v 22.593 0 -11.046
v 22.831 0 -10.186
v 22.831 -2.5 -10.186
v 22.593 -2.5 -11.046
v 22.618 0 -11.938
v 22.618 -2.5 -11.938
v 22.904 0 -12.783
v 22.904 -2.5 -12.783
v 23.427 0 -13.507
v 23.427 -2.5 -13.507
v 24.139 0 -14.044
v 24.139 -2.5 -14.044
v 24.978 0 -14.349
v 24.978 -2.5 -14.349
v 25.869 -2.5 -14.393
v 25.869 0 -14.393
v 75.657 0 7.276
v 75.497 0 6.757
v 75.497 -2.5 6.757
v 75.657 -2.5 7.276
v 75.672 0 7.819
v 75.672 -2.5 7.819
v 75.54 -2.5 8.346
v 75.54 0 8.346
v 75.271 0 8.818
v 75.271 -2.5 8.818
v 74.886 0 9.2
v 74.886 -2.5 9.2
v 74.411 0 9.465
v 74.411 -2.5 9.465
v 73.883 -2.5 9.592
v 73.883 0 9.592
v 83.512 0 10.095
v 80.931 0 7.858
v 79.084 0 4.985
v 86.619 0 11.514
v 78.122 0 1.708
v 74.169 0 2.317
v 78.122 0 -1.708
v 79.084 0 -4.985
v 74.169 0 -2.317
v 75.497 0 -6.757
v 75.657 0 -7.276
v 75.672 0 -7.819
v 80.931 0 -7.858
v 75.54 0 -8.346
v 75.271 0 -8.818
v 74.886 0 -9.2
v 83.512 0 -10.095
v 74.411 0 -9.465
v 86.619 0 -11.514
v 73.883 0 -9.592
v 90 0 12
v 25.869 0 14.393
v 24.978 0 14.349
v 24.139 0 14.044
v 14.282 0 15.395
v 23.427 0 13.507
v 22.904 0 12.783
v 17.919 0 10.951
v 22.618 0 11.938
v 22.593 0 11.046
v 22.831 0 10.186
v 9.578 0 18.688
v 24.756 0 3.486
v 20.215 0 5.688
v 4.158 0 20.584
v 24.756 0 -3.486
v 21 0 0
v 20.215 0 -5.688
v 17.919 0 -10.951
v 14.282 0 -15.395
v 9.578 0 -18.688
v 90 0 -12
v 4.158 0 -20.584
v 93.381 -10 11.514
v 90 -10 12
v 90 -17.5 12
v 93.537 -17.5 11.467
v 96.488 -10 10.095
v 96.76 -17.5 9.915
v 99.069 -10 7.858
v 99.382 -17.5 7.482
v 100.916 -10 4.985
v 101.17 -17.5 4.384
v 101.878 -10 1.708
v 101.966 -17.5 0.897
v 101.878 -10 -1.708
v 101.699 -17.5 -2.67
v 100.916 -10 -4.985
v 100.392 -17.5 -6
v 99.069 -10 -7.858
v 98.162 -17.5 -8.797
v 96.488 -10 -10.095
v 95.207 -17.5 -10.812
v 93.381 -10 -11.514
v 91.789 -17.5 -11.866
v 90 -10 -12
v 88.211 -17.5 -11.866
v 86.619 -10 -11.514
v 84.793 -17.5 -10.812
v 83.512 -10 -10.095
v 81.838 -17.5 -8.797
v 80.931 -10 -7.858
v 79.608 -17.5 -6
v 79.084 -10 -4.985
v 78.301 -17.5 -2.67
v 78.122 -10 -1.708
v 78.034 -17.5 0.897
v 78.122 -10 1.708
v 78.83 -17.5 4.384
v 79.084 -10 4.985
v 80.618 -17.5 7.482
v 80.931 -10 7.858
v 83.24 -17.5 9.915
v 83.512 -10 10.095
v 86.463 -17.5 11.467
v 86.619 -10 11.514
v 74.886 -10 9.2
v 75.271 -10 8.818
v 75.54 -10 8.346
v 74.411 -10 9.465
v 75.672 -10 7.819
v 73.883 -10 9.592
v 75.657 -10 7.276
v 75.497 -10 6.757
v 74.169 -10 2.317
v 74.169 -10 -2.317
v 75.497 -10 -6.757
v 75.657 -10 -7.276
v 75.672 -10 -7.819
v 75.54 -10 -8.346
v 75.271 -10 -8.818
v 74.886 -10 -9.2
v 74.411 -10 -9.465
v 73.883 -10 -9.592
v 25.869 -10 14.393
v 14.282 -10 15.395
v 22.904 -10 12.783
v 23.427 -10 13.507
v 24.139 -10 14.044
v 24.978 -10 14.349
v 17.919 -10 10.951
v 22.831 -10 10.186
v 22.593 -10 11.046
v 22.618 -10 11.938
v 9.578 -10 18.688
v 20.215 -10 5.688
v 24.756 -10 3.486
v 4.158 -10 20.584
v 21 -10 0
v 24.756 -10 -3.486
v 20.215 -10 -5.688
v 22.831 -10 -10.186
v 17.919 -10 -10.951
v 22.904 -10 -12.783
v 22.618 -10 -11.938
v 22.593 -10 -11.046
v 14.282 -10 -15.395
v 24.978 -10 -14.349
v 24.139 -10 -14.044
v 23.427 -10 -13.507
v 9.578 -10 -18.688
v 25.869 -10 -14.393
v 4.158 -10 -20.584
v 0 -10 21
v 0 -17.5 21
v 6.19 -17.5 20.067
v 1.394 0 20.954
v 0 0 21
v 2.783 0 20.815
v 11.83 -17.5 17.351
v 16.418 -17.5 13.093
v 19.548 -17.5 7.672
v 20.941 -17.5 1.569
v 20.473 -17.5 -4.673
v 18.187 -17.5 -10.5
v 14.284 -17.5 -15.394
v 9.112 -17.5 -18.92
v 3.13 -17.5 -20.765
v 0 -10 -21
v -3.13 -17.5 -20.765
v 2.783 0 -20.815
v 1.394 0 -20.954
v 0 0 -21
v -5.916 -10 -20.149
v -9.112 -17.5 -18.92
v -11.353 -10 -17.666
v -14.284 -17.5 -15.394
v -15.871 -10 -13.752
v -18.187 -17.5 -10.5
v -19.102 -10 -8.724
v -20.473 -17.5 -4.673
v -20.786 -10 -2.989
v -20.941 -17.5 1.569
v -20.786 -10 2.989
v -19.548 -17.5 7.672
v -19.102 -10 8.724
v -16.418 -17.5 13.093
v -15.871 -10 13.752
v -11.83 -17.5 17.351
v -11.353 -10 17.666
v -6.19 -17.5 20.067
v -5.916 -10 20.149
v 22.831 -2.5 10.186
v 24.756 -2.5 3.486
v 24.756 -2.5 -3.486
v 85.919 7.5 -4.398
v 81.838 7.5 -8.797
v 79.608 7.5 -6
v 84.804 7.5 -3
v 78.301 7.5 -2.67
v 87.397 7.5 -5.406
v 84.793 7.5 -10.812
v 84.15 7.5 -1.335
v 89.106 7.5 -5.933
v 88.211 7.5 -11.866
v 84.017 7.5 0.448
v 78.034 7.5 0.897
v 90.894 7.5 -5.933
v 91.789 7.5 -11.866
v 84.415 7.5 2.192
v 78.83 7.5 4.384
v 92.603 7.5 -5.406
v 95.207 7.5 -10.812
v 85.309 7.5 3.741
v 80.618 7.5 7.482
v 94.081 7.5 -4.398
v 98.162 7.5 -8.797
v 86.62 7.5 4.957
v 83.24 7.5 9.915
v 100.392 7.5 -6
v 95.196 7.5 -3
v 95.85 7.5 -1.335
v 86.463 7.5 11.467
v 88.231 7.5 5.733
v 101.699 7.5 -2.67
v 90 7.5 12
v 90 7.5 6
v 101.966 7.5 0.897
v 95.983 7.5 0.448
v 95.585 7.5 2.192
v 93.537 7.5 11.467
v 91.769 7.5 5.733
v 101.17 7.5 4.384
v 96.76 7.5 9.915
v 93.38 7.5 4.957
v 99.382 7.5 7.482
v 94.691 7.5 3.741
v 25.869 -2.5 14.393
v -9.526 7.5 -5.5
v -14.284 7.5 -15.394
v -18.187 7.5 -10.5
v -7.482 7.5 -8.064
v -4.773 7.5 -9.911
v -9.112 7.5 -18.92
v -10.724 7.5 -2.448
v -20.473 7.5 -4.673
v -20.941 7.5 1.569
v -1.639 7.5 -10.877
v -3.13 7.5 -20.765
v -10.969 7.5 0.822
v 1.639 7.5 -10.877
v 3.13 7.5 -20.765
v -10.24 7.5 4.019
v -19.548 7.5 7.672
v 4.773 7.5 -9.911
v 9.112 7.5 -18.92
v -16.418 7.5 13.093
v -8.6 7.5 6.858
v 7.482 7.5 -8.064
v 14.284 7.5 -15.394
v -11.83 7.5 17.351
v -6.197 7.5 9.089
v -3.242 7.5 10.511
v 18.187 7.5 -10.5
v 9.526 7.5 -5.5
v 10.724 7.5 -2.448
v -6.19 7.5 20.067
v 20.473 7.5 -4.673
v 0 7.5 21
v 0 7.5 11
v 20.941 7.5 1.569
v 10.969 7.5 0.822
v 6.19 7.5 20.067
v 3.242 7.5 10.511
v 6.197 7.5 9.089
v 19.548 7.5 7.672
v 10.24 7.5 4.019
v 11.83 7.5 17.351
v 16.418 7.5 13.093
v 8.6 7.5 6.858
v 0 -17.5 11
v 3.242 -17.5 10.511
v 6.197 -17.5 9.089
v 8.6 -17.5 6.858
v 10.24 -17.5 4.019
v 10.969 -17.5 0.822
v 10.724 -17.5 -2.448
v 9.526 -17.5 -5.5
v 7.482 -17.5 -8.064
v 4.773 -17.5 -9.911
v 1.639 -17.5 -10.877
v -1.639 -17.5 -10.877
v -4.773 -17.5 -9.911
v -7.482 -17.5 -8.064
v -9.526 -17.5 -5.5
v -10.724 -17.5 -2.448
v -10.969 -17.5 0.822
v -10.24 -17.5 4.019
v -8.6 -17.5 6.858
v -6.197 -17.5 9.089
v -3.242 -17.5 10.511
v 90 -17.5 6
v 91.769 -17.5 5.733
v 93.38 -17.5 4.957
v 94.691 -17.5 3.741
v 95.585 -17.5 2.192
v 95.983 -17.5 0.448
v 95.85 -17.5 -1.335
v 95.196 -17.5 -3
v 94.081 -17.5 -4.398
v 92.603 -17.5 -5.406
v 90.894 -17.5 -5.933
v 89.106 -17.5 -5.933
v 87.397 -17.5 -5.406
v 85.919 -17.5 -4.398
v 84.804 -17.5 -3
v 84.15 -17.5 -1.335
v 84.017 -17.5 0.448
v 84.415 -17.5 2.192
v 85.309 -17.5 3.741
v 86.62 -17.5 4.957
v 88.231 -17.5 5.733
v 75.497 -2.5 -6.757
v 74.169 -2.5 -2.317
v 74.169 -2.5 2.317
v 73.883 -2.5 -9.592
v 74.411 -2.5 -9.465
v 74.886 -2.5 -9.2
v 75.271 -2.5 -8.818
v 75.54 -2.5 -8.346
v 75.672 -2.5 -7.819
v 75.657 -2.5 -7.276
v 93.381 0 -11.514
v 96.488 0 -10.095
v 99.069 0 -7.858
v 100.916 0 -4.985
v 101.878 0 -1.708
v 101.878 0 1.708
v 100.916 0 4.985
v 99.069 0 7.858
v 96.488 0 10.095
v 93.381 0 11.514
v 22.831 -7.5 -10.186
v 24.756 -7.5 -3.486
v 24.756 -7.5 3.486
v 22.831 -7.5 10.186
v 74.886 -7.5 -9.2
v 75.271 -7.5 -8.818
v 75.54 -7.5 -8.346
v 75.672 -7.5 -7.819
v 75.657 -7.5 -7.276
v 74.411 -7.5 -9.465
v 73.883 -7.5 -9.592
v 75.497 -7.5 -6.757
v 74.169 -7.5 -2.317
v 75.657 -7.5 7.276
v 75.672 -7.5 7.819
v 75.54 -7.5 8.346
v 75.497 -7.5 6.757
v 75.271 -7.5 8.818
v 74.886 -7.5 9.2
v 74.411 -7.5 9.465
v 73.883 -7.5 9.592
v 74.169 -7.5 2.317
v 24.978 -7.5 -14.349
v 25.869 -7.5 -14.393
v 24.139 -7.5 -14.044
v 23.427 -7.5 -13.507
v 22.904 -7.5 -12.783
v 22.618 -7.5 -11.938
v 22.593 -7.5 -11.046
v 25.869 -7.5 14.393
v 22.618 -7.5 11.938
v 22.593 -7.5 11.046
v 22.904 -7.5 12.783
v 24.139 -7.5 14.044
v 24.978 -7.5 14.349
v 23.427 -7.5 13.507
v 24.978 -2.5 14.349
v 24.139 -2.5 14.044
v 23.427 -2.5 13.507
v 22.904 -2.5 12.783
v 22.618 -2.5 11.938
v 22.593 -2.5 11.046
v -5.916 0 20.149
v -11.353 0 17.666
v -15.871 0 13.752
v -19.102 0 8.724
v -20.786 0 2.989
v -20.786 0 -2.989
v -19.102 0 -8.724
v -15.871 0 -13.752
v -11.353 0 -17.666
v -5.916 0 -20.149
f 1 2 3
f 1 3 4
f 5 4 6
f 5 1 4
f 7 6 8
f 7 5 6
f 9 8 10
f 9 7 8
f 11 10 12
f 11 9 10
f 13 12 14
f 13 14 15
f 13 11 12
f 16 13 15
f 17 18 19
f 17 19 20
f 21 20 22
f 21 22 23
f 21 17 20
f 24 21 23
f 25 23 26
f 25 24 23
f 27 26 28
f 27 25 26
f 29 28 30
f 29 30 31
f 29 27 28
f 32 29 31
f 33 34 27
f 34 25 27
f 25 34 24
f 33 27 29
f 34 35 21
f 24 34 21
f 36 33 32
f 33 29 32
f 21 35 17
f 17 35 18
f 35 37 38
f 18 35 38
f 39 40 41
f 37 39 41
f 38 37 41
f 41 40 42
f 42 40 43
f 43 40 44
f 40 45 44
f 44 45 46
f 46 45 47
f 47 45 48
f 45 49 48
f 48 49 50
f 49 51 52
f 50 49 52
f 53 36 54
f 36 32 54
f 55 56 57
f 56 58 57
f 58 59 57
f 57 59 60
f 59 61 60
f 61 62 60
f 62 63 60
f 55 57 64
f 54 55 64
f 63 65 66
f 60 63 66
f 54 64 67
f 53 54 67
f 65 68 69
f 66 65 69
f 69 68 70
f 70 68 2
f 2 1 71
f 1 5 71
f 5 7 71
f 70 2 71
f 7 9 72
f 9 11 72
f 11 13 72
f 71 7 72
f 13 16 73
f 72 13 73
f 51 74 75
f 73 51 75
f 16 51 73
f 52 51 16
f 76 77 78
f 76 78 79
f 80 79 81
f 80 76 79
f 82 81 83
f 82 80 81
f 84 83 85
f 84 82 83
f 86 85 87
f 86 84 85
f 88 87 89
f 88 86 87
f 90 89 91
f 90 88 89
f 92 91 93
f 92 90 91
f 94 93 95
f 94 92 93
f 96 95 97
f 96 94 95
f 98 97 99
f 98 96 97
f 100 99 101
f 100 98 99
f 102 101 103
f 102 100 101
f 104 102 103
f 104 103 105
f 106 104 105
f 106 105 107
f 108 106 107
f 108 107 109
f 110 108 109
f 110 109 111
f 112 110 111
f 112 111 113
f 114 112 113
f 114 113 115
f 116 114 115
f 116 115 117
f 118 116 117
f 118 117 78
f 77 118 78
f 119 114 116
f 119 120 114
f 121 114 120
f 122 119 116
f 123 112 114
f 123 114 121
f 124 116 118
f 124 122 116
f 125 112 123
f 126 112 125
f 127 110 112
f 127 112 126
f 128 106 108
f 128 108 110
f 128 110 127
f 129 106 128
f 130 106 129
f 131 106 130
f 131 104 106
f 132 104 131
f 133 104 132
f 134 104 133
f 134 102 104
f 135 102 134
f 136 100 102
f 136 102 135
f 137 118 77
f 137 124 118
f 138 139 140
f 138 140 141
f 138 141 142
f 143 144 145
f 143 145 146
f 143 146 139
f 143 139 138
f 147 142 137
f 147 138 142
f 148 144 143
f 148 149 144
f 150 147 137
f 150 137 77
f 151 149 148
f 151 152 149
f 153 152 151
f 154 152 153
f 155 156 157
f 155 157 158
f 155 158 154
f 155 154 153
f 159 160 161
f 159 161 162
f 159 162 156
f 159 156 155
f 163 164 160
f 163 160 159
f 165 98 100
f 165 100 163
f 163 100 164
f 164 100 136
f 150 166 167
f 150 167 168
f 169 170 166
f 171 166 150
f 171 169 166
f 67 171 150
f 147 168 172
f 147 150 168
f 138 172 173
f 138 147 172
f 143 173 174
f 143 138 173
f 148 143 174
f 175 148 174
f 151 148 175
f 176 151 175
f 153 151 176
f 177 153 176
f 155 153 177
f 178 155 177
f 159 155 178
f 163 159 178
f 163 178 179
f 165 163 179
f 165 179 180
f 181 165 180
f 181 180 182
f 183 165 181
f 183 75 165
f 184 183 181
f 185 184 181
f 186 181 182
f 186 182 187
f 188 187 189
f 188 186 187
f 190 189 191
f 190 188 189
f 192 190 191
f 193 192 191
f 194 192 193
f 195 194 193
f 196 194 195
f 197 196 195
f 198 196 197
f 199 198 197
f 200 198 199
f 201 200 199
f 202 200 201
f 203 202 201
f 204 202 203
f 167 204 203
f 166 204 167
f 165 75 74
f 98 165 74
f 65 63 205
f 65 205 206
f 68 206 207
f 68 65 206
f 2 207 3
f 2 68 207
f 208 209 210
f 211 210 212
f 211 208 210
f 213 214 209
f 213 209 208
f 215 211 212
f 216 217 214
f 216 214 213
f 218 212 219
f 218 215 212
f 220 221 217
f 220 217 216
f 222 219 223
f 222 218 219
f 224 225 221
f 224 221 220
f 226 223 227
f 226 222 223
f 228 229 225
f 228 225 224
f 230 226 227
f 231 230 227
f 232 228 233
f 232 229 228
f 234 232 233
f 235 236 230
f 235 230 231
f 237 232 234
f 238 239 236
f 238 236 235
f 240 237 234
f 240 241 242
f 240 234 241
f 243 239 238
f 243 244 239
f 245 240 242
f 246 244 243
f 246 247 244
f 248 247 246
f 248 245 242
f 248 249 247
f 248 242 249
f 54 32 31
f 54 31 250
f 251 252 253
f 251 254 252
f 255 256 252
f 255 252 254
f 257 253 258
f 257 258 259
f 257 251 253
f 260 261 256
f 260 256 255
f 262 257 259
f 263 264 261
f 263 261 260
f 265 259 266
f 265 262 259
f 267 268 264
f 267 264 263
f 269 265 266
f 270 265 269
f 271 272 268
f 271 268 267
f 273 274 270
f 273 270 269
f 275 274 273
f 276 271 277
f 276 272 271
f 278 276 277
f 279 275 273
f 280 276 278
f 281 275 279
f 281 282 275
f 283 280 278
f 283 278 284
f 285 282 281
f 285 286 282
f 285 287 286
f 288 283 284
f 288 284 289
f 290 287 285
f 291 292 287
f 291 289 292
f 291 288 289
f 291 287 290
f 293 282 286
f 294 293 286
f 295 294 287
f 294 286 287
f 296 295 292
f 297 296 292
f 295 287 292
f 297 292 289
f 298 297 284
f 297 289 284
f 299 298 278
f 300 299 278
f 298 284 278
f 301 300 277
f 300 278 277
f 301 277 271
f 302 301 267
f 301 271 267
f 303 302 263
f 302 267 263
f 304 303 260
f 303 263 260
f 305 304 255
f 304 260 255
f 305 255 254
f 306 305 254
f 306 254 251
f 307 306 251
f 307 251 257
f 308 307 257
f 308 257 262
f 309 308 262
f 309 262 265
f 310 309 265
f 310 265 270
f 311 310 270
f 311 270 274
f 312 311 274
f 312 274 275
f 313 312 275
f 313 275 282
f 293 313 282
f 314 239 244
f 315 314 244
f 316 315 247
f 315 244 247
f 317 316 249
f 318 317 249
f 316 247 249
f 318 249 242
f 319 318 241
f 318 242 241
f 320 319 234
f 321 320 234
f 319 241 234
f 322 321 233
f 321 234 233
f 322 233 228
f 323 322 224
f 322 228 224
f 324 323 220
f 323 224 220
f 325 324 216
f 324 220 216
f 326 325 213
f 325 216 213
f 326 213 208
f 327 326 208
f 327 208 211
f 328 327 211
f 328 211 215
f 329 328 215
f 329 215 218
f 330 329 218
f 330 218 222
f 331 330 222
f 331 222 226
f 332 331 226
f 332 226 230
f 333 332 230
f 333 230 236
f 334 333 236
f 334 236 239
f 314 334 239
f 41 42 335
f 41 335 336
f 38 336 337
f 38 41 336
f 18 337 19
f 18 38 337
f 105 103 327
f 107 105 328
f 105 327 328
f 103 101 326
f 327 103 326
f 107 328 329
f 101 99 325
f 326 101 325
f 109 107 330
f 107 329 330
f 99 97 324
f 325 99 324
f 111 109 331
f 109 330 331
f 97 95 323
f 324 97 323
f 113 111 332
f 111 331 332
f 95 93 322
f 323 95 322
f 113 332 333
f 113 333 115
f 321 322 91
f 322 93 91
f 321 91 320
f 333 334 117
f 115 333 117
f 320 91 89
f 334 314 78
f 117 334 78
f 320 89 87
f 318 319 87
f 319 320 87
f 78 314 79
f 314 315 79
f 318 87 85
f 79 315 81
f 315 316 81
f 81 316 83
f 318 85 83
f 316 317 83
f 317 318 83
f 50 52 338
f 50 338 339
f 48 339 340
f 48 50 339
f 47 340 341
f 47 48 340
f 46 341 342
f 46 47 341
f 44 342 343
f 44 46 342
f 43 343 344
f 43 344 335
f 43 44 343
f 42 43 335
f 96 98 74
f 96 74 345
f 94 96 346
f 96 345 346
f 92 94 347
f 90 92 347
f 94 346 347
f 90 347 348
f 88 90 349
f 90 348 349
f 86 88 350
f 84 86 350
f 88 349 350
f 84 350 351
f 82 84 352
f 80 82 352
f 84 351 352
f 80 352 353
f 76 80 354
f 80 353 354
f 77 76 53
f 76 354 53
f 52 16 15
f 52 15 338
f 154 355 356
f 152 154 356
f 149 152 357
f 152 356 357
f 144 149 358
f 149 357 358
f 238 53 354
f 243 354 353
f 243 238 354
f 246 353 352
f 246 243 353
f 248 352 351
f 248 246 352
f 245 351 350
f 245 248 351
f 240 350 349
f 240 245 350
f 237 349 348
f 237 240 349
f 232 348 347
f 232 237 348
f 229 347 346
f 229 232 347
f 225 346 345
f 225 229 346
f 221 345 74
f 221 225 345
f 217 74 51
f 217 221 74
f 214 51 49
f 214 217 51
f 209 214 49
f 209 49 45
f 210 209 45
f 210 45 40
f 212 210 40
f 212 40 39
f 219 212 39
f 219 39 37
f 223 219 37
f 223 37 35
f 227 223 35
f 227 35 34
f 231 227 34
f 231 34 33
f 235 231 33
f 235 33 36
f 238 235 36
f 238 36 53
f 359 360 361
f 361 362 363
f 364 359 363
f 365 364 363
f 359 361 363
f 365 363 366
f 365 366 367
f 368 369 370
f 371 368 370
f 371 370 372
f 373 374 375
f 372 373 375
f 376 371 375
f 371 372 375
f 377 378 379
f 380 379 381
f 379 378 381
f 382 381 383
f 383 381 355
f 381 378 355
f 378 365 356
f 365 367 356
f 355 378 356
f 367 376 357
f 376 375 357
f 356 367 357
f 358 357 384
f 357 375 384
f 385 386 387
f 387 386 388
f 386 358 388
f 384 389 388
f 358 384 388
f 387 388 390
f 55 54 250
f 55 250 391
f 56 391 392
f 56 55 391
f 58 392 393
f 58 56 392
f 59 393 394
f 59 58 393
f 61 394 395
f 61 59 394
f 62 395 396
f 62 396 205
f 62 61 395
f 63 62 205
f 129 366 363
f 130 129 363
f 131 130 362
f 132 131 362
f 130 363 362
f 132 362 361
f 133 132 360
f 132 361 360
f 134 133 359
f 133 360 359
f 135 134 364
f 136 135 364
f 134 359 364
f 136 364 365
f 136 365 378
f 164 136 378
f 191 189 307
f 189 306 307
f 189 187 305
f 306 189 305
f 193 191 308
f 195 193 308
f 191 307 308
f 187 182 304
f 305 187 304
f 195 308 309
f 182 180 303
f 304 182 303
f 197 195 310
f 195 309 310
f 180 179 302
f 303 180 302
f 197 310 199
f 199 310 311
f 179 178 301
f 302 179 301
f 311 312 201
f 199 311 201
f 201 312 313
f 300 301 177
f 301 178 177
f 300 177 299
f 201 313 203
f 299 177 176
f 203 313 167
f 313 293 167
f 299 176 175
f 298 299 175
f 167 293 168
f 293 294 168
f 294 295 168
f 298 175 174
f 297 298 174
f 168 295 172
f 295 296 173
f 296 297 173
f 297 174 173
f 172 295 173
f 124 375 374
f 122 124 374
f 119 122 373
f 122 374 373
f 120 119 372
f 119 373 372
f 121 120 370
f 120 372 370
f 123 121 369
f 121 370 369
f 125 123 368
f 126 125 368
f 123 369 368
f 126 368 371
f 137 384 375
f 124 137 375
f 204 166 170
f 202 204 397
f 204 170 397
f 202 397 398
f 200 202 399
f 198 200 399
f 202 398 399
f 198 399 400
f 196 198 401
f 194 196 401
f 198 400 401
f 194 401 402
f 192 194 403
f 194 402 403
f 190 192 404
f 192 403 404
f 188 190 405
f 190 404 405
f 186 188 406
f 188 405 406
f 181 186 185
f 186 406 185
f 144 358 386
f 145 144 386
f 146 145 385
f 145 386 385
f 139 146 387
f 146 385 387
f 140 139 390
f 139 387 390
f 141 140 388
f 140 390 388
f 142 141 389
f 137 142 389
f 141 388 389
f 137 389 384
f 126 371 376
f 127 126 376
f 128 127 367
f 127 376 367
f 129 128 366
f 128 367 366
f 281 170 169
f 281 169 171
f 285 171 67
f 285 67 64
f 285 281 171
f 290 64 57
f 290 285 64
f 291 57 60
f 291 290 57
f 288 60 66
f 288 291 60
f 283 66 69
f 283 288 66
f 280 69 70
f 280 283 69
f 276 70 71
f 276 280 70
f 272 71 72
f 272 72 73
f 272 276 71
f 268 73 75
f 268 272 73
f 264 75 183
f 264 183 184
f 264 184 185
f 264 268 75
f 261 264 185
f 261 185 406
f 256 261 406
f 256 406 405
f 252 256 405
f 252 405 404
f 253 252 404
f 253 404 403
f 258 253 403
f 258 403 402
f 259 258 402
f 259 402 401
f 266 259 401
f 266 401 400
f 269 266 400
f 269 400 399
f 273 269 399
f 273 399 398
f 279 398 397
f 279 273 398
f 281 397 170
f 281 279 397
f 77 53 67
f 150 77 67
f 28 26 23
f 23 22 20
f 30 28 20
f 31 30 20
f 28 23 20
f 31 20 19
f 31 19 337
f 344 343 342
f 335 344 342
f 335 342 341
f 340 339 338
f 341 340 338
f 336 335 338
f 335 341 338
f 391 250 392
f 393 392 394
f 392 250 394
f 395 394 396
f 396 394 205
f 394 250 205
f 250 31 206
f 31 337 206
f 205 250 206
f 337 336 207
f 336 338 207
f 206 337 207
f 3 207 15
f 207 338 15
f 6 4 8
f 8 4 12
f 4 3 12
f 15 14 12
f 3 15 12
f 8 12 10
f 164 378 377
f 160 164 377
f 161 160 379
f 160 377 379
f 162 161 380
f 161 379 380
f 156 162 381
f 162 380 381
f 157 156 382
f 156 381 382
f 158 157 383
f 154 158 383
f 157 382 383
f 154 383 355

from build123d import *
from build123d.topology import SkipClean

# Parameters (mm, degrees)
BOSS_EXTRUDE1_DEPTH = 10
SKETCH2_R           = 21
SKETCH2_R_2         = 12
BOSS_EXTRUDE2_DEPTH = 17.5
BOSS_EXTRUDE3_START = 7.5
SKETCH3_R           = 21
SKETCH3_R_2         = 12
BOSS_EXTRUDE3_DEPTH = 7.5
SKETCH4_R           = 11
SKETCH4_R_2         = 6
CUT_EXTRUDE1_DEPTH  = 38.5
CUT_EXTRUDE2_DEPTH  = 2.5
CUT_EXTRUDE3_START  = -2.5
CUT_EXTRUDE3_DEPTH  = 2.5


with BuildPart() as part:
    # Sketch1 → Boss-Extrude1 (new body)
    with BuildSketch(Plane(origin=(0, 0, 0), x_dir=(1, 0, 0), z_dir=(0, 1, 0))):
        with BuildLine():
            Line((0, 21), (90, 12))
            ThreePointArc((90, 12), (102, 0), (90, -12))
            Line((90, -12), (0, -21))
            ThreePointArc((0, -21), (-21, 0), (0, 21))
        make_face()
    extrude(amount=-BOSS_EXTRUDE1_DEPTH)

    # Sketch2 → Boss-Extrude2 (add)
    with SkipClean():  # the faces are left unmerged after this step: merging them gives an invalid solid
        with BuildSketch(Plane(origin=(0, 0, 0), x_dir=(1, 0, 0), z_dir=(0, 1, 0))):
            with Locations(Location((0, 0, 0), (0, 0, 270))):
                Circle(SKETCH2_R)
            with Locations(Location((90, 0, 0), (0, 0, 270))):
                Circle(SKETCH2_R_2)
        extrude(amount=-BOSS_EXTRUDE2_DEPTH)

    # Sketch3 → Boss-Extrude3 (add)
    with SkipClean():  # the faces are left unmerged after this step: merging them gives an invalid solid
        with BuildSketch(Plane(origin=(0, 0, 0), x_dir=(1, 0, 0), z_dir=(0, 1, 0)).offset(BOSS_EXTRUDE3_START)):
            with Locations(Location((0, 0, 0), (0, 0, 270))):
                Circle(SKETCH3_R)
            with Locations(Location((90, 0, 0), (0, 0, 270))):
                Circle(SKETCH3_R_2)
        extrude(amount=-BOSS_EXTRUDE3_DEPTH)

    # Sketch4 → Cut-Extrude1 (cut)
    with SkipClean():  # the faces are left unmerged after this step: merging them gives an invalid solid
        with BuildSketch(Plane(origin=(0, 7.5, 0), x_dir=(1, 0, 0), z_dir=(0, 1, 0))):
            with Locations(Location((0, 0, 0), (0, 0, 270))):
                Circle(SKETCH4_R)
            with Locations(Location((90, 0, 0), (0, 0, 270))):
                Circle(SKETCH4_R_2)
        extrude(amount=-CUT_EXTRUDE1_DEPTH, mode=Mode.SUBTRACT)

    # Sketch5 → Cut-Extrude2 (cut)
    with SkipClean():  # the faces are left unmerged after this step: merging them gives an invalid solid
        with BuildSketch(Plane(origin=(0, 0, 0), x_dir=(1, 0, 0), z_dir=(0, 1, 0))):
            with BuildLine():
                Line((25.869138462, 14.393135905), (73.882928765, 9.591756875))
                ThreePointArc((73.882928765, 9.591756875), (75.42197475, 8.591212838), (75.496818958, 6.757051106))
                ThreePointArc((75.496818958, 6.757051106), (74, 0), (75.496818958, -6.757051106))
                ThreePointArc((75.496818958, -6.757051106), (75.42197475, -8.591212838), (73.882928765, -9.591756875))
                Line((73.882928765, -9.591756875), (25.869138462, -14.393135905))
                ThreePointArc((25.869138462, -14.393135905), (23.13846438, -13.164322574), (22.830917237, -10.185736013))
                ThreePointArc((22.830917237, -10.185736013), (25, 0), (22.830917237, 10.185736013))
                ThreePointArc((22.830917237, 10.185736013), (23.13846438, 13.164322574), (25.869138462, 14.393135905))
            make_face()
        extrude(amount=-CUT_EXTRUDE2_DEPTH, mode=Mode.SUBTRACT)

    # Sketch7 → Cut-Extrude3 (cut)
    with SkipClean():  # the faces are left unmerged after this step: merging them gives an invalid solid
        with BuildSketch(Plane.XZ.offset(10).offset(CUT_EXTRUDE3_START)):
            with BuildLine():
                Line((25.869138462, 14.393135905), (73.882928765, 9.591756875))
                ThreePointArc((73.882928765, 9.591756875), (75.42197475, 8.591212838), (75.496818958, 6.757051106))
                ThreePointArc((75.496818958, 6.757051106), (74, 0), (75.496818958, -6.757051106))
                ThreePointArc((75.496818958, -6.757051106), (75.42197475, -8.591212838), (73.882928765, -9.591756875))
                Line((73.882928765, -9.591756875), (25.869138462, -14.393135905))
                ThreePointArc((25.869138462, -14.393135905), (23.13846438, -13.164322574), (22.830917237, -10.185736013))
                ThreePointArc((22.830917237, -10.185736013), (25, 0), (22.830917237, 10.185736013))
                ThreePointArc((22.830917237, 10.185736013), (23.13846438, 13.164322574), (25.869138462, 14.393135905))
            make_face()
        extrude(amount=CUT_EXTRUDE3_DEPTH, mode=Mode.SUBTRACT)


solid = part.part
